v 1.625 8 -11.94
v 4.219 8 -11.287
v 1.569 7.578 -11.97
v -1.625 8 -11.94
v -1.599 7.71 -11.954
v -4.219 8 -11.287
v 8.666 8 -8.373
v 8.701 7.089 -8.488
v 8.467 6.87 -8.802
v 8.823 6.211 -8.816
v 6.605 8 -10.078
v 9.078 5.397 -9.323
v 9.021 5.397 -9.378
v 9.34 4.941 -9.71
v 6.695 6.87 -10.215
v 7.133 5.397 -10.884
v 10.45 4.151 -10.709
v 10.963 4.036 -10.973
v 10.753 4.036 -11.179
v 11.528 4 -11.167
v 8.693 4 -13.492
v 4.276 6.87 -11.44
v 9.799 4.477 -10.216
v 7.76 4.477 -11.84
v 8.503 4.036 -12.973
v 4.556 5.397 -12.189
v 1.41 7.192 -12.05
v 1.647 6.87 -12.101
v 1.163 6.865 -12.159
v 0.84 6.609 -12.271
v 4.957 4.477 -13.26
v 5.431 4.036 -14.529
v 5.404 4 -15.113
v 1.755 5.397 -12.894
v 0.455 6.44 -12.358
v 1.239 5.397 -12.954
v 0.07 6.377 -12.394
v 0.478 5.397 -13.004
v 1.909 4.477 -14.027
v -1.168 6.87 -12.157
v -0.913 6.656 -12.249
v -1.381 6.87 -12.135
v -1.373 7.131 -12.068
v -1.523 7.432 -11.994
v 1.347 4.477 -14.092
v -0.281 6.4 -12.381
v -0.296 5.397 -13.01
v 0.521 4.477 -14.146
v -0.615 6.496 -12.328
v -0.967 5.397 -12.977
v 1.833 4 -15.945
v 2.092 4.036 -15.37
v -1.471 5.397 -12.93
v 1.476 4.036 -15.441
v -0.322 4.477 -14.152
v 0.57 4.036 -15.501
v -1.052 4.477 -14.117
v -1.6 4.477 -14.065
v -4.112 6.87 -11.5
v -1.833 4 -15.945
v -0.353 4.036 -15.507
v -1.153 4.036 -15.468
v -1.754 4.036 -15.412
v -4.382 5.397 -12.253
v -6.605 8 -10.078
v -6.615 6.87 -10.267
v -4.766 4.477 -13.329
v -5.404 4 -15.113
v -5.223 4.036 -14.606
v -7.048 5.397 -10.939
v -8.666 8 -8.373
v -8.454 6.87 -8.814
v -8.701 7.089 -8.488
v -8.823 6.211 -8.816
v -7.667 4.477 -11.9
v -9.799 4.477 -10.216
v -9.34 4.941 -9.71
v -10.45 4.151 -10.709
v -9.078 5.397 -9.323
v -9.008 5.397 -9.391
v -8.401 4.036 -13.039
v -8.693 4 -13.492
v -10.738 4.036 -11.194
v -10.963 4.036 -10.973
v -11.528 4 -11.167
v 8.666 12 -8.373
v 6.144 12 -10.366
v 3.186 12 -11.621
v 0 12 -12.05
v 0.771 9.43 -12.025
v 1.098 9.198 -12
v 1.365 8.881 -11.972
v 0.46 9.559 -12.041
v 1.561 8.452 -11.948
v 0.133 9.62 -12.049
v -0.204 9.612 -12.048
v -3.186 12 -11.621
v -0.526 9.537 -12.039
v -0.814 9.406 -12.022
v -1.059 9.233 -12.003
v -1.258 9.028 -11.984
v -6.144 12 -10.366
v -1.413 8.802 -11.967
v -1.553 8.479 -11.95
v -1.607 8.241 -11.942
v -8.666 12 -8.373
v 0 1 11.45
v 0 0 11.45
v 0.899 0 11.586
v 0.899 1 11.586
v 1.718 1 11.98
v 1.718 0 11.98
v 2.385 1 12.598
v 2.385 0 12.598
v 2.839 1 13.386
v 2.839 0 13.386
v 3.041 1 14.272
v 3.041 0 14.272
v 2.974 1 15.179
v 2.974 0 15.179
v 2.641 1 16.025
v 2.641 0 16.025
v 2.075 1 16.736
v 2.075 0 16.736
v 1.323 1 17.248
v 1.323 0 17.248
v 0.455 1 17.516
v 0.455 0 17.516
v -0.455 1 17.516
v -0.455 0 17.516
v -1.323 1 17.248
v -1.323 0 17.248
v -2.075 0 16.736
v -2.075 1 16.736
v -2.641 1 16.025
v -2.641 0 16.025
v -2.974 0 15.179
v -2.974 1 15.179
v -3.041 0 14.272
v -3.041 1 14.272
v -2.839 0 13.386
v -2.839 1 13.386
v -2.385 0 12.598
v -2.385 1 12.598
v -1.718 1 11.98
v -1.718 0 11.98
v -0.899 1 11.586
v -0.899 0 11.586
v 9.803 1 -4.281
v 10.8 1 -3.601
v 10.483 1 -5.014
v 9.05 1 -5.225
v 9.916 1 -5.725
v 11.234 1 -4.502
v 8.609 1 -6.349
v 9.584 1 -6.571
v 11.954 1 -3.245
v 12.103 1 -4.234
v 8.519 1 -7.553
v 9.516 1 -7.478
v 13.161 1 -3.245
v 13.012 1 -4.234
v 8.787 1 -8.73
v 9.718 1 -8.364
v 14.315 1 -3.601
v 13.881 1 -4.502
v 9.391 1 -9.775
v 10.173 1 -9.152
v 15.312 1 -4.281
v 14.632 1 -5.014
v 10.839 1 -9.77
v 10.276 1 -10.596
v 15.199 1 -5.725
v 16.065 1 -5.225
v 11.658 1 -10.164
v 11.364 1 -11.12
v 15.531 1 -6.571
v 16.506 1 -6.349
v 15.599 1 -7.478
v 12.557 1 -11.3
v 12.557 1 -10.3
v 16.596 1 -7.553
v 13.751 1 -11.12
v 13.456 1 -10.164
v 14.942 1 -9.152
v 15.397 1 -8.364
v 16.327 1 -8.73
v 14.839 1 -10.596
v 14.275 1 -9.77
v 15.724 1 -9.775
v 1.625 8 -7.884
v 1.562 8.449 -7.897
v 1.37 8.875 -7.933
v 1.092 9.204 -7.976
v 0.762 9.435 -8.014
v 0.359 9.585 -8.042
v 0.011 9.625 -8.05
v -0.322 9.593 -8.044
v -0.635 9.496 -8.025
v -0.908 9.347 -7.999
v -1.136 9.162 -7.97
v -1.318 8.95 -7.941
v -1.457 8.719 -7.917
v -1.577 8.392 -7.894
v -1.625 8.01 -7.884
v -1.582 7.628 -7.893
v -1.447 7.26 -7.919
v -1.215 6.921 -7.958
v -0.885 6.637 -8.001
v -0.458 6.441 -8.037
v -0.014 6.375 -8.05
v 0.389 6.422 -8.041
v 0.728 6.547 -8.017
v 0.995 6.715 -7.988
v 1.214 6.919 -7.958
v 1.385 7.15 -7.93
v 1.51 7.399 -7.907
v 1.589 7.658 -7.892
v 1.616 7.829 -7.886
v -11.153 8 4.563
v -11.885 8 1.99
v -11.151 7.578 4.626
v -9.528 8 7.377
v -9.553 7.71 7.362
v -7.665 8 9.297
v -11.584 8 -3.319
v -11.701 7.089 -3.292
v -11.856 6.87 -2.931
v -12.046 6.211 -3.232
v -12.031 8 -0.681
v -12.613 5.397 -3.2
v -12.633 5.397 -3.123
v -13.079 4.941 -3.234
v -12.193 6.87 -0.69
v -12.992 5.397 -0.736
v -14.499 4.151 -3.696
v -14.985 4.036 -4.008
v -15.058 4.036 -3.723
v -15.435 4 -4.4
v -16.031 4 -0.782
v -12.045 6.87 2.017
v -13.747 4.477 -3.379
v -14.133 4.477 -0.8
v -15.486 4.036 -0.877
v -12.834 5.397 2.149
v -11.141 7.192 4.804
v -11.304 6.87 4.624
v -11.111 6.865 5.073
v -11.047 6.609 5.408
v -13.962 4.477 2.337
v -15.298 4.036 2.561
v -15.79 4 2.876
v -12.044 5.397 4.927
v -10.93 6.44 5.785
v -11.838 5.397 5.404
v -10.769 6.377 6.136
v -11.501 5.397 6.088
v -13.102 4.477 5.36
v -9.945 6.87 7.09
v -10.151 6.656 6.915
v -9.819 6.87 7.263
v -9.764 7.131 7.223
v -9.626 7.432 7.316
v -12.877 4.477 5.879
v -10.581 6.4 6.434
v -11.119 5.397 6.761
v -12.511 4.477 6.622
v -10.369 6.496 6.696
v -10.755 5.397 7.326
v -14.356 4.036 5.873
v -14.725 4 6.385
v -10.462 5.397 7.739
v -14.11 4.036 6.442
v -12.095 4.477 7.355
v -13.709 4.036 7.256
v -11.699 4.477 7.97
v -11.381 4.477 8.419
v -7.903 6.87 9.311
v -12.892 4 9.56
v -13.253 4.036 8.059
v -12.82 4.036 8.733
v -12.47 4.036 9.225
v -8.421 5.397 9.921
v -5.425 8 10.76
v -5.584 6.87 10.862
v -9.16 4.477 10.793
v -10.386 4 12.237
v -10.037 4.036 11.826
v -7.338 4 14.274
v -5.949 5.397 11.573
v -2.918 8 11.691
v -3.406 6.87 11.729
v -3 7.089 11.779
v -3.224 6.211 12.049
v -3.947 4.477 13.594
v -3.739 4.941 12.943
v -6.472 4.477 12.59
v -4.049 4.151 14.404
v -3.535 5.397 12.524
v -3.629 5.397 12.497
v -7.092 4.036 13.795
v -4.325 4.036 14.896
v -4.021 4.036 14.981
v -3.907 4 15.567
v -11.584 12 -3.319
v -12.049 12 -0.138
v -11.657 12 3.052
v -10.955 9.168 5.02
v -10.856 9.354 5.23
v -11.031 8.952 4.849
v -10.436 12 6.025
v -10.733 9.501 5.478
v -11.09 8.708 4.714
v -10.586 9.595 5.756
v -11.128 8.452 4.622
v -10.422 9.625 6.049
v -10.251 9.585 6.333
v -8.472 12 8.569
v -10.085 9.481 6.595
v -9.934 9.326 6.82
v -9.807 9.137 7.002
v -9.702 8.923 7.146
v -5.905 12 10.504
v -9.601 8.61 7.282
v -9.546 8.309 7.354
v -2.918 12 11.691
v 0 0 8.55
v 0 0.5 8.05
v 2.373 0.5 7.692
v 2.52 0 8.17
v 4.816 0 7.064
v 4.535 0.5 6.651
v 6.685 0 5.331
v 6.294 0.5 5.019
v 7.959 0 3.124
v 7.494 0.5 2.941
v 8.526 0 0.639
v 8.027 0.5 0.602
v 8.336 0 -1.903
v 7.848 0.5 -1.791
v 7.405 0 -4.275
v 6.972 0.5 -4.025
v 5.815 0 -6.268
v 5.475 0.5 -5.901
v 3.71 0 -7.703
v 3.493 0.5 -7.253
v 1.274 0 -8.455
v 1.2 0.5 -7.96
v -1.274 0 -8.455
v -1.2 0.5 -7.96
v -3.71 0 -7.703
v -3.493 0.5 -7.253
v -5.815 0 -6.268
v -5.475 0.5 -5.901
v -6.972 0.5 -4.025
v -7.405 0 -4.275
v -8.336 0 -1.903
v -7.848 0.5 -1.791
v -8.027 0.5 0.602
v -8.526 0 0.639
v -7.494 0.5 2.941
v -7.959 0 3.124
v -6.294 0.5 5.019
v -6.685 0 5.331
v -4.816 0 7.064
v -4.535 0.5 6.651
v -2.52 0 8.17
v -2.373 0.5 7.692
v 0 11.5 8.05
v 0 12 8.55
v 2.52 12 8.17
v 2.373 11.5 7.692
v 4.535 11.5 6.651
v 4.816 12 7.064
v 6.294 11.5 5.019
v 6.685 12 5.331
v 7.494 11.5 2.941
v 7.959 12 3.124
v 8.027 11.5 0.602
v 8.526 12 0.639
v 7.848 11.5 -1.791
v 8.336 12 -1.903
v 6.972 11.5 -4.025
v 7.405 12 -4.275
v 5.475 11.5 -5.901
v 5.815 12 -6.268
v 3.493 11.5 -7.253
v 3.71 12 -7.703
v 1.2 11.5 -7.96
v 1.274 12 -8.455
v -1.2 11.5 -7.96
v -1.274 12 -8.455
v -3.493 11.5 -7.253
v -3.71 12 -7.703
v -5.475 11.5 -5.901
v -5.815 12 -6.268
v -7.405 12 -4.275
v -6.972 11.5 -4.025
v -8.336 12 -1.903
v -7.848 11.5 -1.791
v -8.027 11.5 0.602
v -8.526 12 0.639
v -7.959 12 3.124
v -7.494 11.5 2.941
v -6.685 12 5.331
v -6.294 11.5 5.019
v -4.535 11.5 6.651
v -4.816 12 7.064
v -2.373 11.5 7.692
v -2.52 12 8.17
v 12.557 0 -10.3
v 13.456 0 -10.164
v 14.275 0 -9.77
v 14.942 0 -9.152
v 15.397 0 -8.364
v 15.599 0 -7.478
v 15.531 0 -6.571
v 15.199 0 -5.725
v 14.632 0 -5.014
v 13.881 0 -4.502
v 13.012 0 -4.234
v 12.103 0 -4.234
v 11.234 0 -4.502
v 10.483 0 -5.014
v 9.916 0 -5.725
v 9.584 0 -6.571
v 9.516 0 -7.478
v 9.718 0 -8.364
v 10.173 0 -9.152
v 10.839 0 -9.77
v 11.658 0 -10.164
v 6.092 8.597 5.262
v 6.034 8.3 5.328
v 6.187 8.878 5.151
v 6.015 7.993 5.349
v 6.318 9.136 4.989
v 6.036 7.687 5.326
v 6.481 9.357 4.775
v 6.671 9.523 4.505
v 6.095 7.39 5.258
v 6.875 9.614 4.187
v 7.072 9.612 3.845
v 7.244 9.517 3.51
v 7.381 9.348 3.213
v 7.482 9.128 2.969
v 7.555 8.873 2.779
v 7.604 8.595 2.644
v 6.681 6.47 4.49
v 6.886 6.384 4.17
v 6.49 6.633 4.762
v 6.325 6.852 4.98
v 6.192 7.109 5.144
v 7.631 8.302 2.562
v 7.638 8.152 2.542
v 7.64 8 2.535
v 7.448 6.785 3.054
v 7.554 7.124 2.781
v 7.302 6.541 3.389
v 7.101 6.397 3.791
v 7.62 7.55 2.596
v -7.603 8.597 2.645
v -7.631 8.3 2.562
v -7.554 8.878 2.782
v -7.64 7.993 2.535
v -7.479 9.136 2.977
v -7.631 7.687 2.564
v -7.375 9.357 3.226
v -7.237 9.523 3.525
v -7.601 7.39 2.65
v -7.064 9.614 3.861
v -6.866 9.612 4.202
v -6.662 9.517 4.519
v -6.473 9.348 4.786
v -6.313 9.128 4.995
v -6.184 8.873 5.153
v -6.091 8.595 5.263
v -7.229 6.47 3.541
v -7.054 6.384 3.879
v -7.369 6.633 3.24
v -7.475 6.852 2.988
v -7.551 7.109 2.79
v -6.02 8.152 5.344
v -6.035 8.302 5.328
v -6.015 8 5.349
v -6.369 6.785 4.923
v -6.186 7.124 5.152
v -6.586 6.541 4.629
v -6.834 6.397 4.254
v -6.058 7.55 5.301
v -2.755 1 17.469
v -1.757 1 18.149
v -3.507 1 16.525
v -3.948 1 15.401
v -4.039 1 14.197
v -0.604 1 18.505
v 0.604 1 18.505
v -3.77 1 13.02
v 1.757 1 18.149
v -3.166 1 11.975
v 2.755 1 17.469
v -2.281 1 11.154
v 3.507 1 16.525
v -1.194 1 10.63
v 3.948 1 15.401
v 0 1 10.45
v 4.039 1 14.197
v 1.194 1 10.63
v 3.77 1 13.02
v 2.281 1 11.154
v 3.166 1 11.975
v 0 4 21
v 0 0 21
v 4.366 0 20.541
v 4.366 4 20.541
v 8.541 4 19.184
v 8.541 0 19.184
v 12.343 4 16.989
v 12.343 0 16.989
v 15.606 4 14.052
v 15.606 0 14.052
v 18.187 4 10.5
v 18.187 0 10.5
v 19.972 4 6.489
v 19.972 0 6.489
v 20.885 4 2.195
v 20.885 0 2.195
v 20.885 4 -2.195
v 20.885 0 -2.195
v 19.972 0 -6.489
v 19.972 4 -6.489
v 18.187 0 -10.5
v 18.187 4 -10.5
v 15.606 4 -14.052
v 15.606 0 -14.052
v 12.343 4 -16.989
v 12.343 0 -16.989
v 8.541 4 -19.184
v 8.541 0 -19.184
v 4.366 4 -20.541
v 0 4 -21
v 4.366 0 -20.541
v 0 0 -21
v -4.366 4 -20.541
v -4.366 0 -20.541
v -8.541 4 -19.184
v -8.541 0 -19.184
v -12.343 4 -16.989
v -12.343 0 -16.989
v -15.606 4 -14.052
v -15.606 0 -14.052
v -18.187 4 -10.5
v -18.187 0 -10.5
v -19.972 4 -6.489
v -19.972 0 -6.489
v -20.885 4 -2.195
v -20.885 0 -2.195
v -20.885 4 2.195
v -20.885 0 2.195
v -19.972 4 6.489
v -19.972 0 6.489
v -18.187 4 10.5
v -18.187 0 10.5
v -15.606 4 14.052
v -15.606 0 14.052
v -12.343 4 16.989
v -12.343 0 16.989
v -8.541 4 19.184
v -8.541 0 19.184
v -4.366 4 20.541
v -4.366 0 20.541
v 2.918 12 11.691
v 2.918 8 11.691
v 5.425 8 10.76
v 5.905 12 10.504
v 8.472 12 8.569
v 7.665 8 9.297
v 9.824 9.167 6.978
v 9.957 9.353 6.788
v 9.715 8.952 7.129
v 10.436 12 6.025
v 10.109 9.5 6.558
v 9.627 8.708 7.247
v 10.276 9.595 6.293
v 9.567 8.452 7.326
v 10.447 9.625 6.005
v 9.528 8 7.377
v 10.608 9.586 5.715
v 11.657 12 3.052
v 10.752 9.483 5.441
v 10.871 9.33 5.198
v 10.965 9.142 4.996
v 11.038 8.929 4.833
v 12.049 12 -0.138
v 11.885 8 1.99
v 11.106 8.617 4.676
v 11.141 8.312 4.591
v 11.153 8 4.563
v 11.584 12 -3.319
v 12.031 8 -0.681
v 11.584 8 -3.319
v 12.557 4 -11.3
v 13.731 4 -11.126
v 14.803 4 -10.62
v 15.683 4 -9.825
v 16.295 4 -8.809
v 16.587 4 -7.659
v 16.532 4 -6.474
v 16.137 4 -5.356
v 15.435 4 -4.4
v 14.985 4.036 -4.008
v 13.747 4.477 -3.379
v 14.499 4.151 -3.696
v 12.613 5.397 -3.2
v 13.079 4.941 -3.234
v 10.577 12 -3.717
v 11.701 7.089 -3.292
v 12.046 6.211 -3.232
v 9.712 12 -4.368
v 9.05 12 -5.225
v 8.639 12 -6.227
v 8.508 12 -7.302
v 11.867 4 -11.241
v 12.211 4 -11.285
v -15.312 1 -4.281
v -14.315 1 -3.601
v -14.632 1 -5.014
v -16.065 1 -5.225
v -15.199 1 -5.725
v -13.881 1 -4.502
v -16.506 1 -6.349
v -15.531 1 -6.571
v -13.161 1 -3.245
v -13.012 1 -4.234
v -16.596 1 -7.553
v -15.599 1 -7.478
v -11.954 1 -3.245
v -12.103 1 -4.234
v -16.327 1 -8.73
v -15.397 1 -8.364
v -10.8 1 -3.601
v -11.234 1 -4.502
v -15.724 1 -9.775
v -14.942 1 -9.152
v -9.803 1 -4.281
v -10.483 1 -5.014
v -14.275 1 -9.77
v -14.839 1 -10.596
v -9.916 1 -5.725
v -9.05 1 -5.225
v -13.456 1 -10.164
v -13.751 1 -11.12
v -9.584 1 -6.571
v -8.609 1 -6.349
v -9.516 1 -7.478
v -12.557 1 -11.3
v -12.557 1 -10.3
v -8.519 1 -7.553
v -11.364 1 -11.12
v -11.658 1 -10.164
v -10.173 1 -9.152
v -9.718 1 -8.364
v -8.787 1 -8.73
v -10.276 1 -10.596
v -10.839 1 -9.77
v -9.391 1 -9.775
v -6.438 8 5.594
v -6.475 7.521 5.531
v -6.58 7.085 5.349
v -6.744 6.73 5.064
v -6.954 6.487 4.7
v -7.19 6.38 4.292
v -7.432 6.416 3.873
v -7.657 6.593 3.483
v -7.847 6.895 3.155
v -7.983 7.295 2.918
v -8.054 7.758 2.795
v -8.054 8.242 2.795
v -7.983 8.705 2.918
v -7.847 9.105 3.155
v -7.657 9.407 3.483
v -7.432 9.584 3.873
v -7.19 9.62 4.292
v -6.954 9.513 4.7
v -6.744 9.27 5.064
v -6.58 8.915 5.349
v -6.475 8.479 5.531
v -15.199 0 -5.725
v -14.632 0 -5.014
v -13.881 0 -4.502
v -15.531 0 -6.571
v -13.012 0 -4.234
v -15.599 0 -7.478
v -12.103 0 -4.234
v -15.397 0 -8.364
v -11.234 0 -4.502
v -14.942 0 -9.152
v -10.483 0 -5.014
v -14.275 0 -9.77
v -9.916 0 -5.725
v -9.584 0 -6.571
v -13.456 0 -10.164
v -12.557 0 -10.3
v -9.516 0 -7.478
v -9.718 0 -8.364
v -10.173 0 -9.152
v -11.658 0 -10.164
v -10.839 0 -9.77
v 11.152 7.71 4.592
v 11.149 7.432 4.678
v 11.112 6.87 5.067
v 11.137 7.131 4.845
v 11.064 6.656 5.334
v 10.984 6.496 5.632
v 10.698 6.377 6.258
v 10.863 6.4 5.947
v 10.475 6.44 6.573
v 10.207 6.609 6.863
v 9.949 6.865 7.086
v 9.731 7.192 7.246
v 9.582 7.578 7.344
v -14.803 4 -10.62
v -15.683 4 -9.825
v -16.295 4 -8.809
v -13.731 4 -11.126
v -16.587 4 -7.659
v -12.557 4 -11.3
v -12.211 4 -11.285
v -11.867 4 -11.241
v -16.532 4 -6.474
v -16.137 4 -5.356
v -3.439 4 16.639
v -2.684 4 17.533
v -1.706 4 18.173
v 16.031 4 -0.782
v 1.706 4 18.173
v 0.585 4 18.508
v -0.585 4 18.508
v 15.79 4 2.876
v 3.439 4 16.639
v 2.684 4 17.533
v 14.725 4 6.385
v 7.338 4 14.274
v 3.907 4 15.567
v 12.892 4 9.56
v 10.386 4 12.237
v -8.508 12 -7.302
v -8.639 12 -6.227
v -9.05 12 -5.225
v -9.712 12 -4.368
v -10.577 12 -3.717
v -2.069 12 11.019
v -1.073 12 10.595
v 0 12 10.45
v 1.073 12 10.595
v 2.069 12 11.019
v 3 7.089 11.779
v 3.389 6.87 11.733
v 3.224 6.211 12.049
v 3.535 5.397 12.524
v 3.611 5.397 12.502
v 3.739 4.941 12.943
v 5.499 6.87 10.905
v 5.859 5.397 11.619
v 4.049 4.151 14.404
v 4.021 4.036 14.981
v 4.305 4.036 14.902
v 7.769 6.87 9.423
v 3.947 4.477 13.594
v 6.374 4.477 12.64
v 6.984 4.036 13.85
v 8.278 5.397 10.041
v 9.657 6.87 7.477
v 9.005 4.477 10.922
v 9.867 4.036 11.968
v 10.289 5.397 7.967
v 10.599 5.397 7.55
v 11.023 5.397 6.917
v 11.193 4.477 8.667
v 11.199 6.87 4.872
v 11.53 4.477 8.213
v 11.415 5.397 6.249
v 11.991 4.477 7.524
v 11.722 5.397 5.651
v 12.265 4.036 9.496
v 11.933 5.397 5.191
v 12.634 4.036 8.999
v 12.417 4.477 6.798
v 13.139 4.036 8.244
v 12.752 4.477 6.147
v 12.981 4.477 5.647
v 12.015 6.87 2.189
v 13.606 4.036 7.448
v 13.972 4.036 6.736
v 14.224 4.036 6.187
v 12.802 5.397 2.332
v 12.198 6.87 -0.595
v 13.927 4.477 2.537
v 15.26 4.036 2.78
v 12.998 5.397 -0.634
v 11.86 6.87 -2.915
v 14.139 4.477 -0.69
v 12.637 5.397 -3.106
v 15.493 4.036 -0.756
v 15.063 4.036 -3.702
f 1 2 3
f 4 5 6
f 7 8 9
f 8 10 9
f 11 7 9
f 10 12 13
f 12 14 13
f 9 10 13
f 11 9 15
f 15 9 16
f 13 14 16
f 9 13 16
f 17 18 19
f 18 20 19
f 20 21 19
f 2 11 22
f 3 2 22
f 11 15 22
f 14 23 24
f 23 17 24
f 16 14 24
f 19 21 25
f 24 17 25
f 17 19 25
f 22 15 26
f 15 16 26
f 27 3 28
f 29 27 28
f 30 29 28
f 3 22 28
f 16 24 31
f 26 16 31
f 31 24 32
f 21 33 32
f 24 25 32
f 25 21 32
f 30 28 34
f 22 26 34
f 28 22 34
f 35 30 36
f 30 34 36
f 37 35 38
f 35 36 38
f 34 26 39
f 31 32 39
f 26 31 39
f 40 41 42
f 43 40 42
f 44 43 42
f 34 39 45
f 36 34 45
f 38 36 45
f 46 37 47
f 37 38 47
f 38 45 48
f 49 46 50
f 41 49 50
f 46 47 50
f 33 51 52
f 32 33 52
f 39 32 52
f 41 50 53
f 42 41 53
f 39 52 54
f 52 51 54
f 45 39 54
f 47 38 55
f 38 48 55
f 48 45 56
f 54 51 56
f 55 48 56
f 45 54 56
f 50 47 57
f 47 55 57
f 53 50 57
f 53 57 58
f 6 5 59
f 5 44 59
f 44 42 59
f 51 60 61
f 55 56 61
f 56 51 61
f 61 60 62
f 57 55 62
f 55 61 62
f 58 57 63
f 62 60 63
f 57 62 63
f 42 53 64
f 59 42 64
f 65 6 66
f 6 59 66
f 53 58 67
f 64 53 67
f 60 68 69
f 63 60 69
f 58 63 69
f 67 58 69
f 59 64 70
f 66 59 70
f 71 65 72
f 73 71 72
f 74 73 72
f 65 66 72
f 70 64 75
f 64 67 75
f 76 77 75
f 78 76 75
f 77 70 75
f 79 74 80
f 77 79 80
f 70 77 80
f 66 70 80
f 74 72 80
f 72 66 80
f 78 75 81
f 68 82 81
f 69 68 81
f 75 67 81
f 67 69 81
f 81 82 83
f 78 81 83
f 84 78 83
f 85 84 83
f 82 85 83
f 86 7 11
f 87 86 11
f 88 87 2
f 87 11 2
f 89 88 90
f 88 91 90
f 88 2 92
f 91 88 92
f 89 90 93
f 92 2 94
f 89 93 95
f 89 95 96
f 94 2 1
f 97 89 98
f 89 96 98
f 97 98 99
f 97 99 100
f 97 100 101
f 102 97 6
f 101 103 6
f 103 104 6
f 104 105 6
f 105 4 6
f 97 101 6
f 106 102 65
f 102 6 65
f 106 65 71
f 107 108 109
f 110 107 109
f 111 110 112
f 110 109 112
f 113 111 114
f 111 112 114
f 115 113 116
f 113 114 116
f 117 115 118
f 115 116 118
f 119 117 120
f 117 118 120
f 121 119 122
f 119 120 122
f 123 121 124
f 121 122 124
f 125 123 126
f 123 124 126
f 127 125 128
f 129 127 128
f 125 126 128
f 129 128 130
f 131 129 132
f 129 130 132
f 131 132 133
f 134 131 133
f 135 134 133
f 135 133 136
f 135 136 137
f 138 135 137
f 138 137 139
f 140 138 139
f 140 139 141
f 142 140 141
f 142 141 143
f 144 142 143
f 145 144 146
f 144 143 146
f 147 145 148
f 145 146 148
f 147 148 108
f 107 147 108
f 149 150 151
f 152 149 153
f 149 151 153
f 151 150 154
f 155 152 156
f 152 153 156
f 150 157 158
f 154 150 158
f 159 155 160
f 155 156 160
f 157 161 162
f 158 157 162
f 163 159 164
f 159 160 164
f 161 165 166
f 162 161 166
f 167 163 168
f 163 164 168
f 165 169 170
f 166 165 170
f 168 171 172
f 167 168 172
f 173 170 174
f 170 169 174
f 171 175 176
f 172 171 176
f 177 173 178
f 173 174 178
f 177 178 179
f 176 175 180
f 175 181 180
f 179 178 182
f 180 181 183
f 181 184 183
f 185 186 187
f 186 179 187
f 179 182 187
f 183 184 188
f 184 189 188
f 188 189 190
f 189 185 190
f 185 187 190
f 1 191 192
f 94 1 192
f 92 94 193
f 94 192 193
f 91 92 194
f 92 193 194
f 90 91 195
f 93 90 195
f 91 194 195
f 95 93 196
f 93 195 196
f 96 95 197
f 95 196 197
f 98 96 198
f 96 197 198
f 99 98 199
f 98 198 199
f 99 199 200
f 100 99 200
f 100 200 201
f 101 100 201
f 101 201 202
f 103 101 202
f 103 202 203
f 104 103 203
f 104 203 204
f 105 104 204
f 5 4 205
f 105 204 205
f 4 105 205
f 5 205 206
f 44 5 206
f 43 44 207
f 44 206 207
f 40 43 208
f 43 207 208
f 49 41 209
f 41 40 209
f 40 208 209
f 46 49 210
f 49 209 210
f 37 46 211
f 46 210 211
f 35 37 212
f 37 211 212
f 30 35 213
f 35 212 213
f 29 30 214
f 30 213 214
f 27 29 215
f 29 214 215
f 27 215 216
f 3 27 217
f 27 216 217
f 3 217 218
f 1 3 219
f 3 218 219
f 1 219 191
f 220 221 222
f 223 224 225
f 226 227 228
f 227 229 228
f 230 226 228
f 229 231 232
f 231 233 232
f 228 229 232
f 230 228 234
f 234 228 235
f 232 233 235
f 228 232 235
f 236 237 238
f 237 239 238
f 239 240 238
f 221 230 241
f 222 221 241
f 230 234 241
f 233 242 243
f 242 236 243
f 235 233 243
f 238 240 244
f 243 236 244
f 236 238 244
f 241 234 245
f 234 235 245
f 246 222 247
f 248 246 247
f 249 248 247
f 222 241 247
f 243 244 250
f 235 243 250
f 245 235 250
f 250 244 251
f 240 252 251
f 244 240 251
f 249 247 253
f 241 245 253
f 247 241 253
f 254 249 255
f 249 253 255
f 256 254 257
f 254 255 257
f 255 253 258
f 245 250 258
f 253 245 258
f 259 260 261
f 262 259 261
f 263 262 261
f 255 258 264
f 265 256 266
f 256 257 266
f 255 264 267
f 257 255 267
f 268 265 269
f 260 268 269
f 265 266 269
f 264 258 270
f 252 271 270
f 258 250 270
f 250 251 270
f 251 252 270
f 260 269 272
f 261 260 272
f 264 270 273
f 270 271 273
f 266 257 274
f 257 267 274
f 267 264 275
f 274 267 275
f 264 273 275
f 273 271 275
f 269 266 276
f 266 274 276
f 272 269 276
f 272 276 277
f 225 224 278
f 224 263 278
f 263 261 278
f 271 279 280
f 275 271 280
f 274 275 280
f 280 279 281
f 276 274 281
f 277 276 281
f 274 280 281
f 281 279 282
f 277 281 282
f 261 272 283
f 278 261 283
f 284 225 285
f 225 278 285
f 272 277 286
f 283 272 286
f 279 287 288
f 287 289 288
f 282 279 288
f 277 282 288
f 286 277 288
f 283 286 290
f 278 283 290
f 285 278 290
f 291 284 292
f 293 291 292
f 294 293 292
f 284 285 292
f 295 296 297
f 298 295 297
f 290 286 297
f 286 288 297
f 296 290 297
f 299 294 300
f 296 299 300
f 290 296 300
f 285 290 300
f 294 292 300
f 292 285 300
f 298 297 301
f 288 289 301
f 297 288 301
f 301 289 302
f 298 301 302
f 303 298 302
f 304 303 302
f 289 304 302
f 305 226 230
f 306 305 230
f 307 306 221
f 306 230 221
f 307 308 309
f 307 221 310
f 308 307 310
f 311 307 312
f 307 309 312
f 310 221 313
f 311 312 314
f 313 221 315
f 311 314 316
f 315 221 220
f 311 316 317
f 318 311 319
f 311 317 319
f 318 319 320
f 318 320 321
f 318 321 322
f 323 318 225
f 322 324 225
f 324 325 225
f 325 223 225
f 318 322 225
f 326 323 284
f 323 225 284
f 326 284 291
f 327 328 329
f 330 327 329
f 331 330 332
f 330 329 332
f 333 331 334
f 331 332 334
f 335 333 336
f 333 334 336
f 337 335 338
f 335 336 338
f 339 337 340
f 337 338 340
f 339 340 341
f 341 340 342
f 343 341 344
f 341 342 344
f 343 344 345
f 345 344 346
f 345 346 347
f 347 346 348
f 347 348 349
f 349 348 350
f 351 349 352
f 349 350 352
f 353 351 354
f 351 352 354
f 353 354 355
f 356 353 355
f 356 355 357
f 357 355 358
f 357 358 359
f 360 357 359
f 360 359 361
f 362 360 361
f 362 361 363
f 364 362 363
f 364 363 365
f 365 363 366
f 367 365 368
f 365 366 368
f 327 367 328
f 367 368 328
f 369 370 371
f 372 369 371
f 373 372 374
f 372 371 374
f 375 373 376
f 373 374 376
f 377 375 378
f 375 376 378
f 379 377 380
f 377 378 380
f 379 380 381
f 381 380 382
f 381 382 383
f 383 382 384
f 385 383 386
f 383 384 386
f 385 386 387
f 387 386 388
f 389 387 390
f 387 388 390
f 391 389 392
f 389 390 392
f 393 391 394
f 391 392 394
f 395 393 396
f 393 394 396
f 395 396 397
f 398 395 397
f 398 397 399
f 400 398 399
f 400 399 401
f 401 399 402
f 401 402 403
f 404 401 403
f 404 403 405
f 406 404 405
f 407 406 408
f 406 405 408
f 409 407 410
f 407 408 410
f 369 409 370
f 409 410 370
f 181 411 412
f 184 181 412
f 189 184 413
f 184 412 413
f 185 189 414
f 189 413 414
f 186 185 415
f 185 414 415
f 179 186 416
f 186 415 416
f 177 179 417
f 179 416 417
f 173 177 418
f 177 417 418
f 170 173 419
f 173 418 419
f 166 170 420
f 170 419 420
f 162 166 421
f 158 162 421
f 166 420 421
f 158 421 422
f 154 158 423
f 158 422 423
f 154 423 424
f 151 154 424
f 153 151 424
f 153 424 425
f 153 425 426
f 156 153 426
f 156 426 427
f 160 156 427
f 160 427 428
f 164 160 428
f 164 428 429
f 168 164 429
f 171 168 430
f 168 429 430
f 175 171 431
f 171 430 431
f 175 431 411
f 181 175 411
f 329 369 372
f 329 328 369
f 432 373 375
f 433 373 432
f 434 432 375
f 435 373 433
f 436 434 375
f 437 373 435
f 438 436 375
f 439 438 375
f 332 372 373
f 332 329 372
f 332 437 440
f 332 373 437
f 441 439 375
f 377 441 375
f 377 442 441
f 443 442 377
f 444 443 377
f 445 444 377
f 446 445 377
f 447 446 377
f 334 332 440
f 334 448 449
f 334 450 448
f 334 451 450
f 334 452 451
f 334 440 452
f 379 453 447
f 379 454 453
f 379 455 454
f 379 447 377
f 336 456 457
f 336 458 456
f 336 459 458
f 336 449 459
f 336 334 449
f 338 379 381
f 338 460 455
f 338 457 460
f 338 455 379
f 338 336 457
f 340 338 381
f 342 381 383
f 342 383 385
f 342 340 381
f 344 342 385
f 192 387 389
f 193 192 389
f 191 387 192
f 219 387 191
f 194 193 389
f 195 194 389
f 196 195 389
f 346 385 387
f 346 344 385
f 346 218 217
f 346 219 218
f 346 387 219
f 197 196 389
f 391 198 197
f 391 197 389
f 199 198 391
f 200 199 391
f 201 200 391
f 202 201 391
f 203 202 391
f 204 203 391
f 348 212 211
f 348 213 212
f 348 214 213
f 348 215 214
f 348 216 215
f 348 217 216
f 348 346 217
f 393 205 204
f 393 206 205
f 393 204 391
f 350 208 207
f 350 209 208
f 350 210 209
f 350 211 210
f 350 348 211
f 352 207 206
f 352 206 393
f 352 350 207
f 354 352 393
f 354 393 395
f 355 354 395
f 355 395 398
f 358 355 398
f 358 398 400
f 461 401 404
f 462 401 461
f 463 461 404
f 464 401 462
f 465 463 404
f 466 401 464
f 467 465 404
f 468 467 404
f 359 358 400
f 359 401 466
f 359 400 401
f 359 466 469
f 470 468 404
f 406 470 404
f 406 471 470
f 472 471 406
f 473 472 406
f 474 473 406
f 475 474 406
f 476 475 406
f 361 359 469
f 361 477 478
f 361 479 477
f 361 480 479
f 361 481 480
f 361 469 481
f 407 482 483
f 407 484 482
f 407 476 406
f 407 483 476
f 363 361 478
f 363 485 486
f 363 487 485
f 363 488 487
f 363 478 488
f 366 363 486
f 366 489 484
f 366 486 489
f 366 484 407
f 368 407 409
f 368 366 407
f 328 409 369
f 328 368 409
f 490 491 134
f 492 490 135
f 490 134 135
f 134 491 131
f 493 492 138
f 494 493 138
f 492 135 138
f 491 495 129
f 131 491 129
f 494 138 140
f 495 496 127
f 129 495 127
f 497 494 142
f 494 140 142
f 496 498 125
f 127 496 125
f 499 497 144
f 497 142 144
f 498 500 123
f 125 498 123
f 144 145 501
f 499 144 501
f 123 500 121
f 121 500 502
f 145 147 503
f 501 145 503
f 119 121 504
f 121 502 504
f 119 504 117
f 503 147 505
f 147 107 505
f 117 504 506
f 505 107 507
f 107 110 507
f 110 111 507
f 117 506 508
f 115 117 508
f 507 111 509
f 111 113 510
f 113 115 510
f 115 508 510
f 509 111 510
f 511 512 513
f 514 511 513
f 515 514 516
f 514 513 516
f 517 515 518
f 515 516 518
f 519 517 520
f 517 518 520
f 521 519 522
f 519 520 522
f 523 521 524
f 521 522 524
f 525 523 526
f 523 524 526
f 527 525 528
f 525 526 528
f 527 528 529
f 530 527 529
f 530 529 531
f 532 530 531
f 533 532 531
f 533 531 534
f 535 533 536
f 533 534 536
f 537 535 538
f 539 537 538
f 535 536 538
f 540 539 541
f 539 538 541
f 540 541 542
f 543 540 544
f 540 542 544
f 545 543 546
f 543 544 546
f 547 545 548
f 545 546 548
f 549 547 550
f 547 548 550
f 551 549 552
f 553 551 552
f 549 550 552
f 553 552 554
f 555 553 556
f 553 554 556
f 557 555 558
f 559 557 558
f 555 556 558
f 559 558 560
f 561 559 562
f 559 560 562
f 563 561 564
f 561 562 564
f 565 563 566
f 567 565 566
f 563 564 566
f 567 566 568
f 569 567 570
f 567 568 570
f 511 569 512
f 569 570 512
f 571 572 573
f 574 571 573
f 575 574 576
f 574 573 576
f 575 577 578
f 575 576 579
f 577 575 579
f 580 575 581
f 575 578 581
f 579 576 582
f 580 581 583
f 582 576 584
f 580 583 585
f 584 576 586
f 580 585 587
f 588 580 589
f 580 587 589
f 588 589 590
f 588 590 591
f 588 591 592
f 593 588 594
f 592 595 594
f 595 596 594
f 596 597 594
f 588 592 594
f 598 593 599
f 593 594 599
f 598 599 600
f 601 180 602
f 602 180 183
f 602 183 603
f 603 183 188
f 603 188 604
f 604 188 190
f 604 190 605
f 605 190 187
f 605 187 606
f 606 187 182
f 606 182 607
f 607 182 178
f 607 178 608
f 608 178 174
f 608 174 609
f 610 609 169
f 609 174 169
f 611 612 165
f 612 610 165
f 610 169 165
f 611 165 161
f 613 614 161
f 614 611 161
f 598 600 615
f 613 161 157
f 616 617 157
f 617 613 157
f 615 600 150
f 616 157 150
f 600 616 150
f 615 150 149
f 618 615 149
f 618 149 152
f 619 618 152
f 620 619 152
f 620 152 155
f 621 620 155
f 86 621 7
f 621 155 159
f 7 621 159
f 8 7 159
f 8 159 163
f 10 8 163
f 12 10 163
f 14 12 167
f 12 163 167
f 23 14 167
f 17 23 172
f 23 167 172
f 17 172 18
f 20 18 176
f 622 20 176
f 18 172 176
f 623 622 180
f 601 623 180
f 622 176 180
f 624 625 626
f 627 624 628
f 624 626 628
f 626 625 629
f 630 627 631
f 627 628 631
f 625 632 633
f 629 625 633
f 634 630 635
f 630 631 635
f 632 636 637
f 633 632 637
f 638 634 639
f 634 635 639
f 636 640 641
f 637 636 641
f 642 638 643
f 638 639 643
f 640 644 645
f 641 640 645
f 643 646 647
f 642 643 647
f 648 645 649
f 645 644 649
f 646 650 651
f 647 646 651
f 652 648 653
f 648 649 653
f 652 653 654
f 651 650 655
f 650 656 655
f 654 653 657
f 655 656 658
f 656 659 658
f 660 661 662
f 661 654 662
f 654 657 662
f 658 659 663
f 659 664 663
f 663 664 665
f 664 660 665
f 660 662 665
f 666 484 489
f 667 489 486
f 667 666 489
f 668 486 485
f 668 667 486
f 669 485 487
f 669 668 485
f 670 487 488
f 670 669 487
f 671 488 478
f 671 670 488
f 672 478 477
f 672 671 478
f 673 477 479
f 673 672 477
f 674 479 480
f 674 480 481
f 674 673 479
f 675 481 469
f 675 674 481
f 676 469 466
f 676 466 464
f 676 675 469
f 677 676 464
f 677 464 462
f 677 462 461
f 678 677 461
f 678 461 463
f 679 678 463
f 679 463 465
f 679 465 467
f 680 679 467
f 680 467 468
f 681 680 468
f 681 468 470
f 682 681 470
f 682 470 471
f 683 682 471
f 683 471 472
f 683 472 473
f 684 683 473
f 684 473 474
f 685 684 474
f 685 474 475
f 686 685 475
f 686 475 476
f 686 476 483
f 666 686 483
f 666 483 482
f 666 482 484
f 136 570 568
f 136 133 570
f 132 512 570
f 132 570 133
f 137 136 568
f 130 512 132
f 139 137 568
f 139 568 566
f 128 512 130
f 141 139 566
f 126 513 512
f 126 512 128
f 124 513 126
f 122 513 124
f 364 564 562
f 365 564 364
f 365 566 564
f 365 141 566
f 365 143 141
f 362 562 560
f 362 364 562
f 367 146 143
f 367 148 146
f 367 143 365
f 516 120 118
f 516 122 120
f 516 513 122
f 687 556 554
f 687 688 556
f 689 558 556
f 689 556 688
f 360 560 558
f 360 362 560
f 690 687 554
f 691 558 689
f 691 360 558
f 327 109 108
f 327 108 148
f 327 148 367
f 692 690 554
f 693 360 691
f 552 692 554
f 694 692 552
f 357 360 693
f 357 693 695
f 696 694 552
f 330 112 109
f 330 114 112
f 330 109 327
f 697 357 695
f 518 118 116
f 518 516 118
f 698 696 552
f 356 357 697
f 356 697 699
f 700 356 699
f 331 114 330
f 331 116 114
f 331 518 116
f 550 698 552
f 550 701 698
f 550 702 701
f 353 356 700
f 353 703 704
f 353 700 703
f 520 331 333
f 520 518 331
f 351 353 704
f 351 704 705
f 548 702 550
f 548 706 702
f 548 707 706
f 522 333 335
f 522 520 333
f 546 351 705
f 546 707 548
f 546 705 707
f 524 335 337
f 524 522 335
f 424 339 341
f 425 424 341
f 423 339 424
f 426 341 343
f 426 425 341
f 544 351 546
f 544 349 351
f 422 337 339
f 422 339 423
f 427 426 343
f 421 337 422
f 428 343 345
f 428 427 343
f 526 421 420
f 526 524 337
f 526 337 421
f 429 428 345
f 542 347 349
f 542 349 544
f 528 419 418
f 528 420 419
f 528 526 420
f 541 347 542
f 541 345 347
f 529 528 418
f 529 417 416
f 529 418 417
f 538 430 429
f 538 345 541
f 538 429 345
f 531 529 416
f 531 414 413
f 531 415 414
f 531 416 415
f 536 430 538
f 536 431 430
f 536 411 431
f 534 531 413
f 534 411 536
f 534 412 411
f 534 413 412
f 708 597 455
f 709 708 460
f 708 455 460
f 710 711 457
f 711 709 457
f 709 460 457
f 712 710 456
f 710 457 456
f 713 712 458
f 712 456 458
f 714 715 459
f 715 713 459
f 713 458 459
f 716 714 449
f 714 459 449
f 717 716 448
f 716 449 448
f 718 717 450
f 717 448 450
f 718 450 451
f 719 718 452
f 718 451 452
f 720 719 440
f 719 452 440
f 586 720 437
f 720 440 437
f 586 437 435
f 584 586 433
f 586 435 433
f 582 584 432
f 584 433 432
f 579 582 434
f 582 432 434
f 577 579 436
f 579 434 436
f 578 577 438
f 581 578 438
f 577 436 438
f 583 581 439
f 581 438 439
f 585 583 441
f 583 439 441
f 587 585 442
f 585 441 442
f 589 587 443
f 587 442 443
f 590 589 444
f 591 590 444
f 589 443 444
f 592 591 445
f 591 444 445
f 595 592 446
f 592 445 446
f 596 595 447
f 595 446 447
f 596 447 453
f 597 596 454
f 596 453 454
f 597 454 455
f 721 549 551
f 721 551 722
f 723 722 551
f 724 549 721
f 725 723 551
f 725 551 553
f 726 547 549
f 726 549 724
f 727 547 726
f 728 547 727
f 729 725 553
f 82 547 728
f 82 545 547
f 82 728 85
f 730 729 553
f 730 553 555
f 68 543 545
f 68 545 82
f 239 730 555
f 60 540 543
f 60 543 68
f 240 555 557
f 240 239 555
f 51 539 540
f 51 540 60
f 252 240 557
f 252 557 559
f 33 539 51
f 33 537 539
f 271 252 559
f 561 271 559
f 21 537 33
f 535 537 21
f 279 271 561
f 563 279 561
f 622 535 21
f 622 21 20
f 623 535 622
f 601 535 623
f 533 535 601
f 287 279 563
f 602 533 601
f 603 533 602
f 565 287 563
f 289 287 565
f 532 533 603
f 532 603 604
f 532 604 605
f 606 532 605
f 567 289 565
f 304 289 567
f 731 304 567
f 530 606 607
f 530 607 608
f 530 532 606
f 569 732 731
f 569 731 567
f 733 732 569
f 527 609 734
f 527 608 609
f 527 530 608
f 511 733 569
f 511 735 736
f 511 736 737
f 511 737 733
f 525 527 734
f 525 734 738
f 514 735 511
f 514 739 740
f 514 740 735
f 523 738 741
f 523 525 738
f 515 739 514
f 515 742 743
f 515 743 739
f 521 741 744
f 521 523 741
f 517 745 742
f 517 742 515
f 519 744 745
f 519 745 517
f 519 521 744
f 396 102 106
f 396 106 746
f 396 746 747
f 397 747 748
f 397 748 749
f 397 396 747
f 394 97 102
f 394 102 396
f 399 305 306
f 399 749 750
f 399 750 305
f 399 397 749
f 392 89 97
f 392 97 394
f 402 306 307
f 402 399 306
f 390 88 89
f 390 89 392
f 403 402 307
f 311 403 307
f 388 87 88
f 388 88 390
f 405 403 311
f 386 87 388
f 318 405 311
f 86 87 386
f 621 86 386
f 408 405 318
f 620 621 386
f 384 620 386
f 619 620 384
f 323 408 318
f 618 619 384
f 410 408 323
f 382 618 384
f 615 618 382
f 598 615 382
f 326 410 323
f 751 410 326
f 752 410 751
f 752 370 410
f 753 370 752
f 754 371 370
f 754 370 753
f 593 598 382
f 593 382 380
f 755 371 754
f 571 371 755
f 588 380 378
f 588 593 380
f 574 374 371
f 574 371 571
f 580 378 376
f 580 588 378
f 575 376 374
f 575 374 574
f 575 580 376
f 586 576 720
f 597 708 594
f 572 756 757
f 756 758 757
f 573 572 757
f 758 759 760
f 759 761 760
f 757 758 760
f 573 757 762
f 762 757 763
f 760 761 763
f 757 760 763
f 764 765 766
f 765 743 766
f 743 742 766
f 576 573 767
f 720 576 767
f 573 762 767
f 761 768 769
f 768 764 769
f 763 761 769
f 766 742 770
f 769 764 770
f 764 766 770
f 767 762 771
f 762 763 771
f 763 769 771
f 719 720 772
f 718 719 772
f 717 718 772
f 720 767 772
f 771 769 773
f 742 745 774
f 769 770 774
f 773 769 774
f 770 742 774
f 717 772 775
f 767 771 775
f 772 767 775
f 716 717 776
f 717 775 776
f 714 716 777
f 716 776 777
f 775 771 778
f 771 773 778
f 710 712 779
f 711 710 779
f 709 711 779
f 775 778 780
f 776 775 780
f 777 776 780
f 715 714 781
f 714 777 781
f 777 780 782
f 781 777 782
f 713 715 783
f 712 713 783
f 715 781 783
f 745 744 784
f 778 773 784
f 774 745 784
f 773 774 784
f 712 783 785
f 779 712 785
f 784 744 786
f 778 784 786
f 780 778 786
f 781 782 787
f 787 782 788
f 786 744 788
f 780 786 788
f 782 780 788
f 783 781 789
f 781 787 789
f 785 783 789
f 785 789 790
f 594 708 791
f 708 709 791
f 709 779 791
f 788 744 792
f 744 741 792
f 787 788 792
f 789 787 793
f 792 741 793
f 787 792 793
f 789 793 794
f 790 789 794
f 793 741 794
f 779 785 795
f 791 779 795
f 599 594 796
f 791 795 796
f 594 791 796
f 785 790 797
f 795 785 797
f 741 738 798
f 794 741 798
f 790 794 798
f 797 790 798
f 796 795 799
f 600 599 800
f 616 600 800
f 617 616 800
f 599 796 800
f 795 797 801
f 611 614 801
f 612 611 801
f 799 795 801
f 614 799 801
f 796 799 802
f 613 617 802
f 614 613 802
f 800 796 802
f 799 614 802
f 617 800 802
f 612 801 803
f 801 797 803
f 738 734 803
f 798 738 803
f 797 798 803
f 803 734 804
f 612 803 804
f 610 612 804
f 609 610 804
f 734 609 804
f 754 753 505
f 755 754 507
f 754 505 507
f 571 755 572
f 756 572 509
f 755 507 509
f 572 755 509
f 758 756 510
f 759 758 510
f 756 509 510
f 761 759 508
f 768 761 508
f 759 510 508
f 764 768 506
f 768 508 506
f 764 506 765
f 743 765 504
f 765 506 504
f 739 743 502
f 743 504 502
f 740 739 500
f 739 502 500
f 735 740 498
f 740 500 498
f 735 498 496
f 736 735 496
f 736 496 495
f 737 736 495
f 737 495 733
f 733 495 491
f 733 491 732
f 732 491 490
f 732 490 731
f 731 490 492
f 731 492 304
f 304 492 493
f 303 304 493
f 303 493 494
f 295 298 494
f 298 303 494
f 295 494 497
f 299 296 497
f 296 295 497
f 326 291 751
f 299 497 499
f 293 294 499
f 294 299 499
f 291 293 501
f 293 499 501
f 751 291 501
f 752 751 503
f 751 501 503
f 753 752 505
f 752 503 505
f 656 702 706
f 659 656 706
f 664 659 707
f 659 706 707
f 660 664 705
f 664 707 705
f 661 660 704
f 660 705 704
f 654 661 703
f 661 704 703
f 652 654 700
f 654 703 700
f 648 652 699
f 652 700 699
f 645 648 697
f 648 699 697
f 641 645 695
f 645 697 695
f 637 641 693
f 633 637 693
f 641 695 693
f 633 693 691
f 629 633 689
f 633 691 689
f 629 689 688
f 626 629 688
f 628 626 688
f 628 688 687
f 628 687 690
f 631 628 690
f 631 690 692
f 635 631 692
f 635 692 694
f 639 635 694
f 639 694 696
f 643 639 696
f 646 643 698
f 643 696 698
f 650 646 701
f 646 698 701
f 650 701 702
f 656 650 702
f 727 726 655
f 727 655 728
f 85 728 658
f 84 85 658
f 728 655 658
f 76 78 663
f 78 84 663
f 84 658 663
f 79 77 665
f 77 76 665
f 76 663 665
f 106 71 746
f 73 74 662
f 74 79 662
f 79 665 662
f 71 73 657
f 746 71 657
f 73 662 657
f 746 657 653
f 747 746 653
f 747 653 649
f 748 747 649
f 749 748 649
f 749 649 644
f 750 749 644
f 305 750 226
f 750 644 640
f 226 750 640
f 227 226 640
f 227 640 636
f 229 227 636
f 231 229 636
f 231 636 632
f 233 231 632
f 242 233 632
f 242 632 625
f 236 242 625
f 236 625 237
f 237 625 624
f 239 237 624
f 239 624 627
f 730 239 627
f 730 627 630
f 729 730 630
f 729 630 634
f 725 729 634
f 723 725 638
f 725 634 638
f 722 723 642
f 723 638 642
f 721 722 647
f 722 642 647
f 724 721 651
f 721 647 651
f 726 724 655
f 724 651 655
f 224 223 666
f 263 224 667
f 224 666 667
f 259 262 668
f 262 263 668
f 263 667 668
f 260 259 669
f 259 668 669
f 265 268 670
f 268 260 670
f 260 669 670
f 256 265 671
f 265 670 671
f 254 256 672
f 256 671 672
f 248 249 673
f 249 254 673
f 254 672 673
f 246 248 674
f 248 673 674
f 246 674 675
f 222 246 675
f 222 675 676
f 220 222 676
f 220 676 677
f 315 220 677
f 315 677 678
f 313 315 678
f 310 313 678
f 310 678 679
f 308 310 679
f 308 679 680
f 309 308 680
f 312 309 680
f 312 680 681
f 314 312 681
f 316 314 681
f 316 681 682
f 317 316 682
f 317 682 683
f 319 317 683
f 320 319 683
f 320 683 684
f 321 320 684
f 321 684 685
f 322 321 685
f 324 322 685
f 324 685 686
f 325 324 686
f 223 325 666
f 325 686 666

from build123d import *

# Parameters (mm, degrees)
CROQUIS2_R                        = 21
CROQUIS2_R_2                      = 8.05
SALIENTE_EXTRUIR1_DEPTH           = 4
CROQUIS3_R                        = 12.05
CROQUIS3_R_2                      = 8.05
SALIENTE_EXTRUIR2_DEPTH           = 8
REDONDEO1_R                       = 4
CORTAR_EXTRUIR2_REACH             = 34.031
CROQUIS5_R                        = 4.05
CROQUIS4_R                        = 1.625
CORTAR_EXTRUIR3_DEPTH             = 33.031234794
CORTAR_EXTRUIR4_REACH             = 41.705
CROQUIS6_R                        = 1.625
CORTAR_EXTRUIR4_DIRECTION_2_REACH = 41.705
CROQUIS7_R                        = 4.05
CROQUIS7_R_2                      = 3.05
SALIENTE_EXTRUIR3_DEPTH           = 1
CHAFL_N1_SIZE                     = 0.5
CORTAR_EXTRUIR5_REACH             = 41.705
CROQUIS8_R                        = 1.625
CORTAR_EXTRUIR5_DIRECTION_2_REACH = 41.705


with BuildPart() as part:
    # Croquis2 → Saliente-Extruir1 (new body)
    with BuildSketch(Plane(origin=(0, 0, 0), x_dir=(1, 0, 0), z_dir=(0, 1, 0))):
        with Locations(Location((0, 0, 0), (0, 0, 270))):
            Circle(CROQUIS2_R)
        with Locations(Location((0, 0, 0), (0, 0, 270))):
            Circle(CROQUIS2_R_2, mode=Mode.SUBTRACT)
    extrude(amount=SALIENTE_EXTRUIR1_DEPTH)

    # Croquis3 → Saliente-Extruir2 (add)
    with BuildSketch(Plane(origin=(0, 4, 0), x_dir=(1, 0, 0), z_dir=(0, 1, 0))):
        with Locations(Location((0, 0, 0), (0, 0, 270))):
            Circle(CROQUIS3_R)
        with Locations(Location((0, 0, 0), (0, 0, 270))):
            Circle(CROQUIS3_R_2, mode=Mode.SUBTRACT)
    extrude(amount=SALIENTE_EXTRUIR2_DEPTH)

    # Redondeo1
    redondeo1_edges = [part.edges().sort_by_distance(p)[0] for p in [
        (0, 4, -12.05),
    ]]
    fillet(redondeo1_edges, radius=REDONDEO1_R)

    # Croquis5 → Cortar-Extruir2 (cut, up to next)
    with BuildSketch(Plane.XZ, mode=Mode.PRIVATE) as cortar_extruir2_sk1:
        with Locations(Location((0, 14.5, 0), (0, 0, 270))):
            Circle(CROQUIS5_R)
    cortar_extruir2_tool1 = extrude(cortar_extruir2_sk1.sketch, amount=-CORTAR_EXTRUIR2_REACH, mode=Mode.PRIVATE) & part.part
    # Croquis5 → Cortar-Extruir2 (cut, up to next)
    with BuildSketch(Plane.XZ, mode=Mode.PRIVATE) as cortar_extruir2_sk2:
        with Locations(Location((12.557368355, -7.25, 0), (0, 0, 270))):
            Circle(CROQUIS5_R)
    cortar_extruir2_tool2 = extrude(cortar_extruir2_sk2.sketch, amount=-CORTAR_EXTRUIR2_REACH, mode=Mode.PRIVATE) & part.part
    # Croquis5 → Cortar-Extruir2 (cut, up to next)
    with BuildSketch(Plane.XZ, mode=Mode.PRIVATE) as cortar_extruir2_sk3:
        with Locations(Location((-12.557368355, -7.25, 0), (0, 0, 270))):
            Circle(CROQUIS5_R)
    cortar_extruir2_tool3 = extrude(cortar_extruir2_sk3.sketch, amount=-CORTAR_EXTRUIR2_REACH, mode=Mode.PRIVATE) & part.part
    add(cortar_extruir2_tool1.solids().sort_by_distance((0, 0, 14.5))[0], mode=Mode.SUBTRACT)
    add(cortar_extruir2_tool2.solids().sort_by_distance((12.557368, 0, -7.25))[0], mode=Mode.SUBTRACT)
    add(cortar_extruir2_tool3.solids().sort_by_distance((-12.557368, 0, -7.25))[0], mode=Mode.SUBTRACT)

    # Croquis4 → Cortar-Extruir3 (cut, through all)
    with BuildSketch(Plane.XY):
        with Locations((0, 8)):
            Circle(CROQUIS4_R)
    extrude(amount=-CORTAR_EXTRUIR3_DEPTH, mode=Mode.SUBTRACT)

    # Croquis6 → Cortar-Extruir4 (cut, up to next)
    with BuildSketch(Plane(origin=(7.250941954, 0, 4.186333289), x_dir=(-0.5000000000000033, 0, 0.8660254037844367), z_dir=(-0.8660254037844367, 0, -0.5000000000000033)), mode=Mode.PRIVATE) as cortar_extruir4_sk1:
        with Locations(Location((0, 8, 0), (0, 0, 180))):
            Circle(CROQUIS6_R)
    cortar_extruir4_tool1 = extrude(cortar_extruir4_sk1.sketch, amount=-CORTAR_EXTRUIR4_REACH, mode=Mode.PRIVATE) & part.part
    add(cortar_extruir4_tool1.solids().sort_by_distance((7.250942, 8, 4.186333))[0], mode=Mode.SUBTRACT)

    # Croquis6 → Cortar-Extruir4 direction 2 (cut, up to next)
    with BuildSketch(Plane(origin=(7.250941954, 0, 4.186333289), x_dir=(-0.5000000000000033, 0, 0.8660254037844367), z_dir=(-0.8660254037844367, 0, -0.5000000000000033)), mode=Mode.PRIVATE) as cortar_extruir4_direction_2_sk1:
        with Locations(Location((0, 8, 0), (0, 0, 180))):
            Circle(CROQUIS6_R)
    cortar_extruir4_direction_2_tool1 = extrude(cortar_extruir4_direction_2_sk1.sketch, amount=CORTAR_EXTRUIR4_DIRECTION_2_REACH, mode=Mode.PRIVATE) & part.part
    add(cortar_extruir4_direction_2_tool1.solids().sort_by_distance((7.250942, 8, 4.186333))[0], mode=Mode.SUBTRACT)

    # Croquis7 → Saliente-Extruir3 (add)
    # profile 1 of 3: a face of its own
    with BuildSketch(Plane.XZ):
        with Locations(Location((0, 14.5, 0), (0, 0, 270))):
            Circle(CROQUIS7_R)
        with Locations(Location((0, 14.5, 0), (0, 0, 270))):
            Circle(CROQUIS7_R_2, mode=Mode.SUBTRACT)
    # profile 2 of 3: a face of its own
    with BuildSketch(Plane.XZ):
        with Locations(Location((12.557368355, -7.25, 0), (0, 0, 270))):
            Circle(CROQUIS7_R)
        with Locations(Location((12.557368355, -7.25, 0), (0, 0, 270))):
            Circle(CROQUIS7_R_2, mode=Mode.SUBTRACT)
    # profile 3 of 3: a face of its own
    with BuildSketch(Plane.XZ):
        with Locations(Location((-12.557368355, -7.25, 0), (0, 0, 270))):
            Circle(CROQUIS7_R)
        with Locations(Location((-12.557368355, -7.25, 0), (0, 0, 270))):
            Circle(CROQUIS7_R_2, mode=Mode.SUBTRACT)
    extrude(amount=-SALIENTE_EXTRUIR3_DEPTH)

    # Chaflán1
    chafl_n1_edges = [part.edges().sort_by_distance(p)[0] for p in [
        (0, 12, -8.05),
        (0, 0, -8.05),
    ]]
    chamfer(chafl_n1_edges, length=CHAFL_N1_SIZE)

    # Croquis8 → Cortar-Extruir5 (cut, up to next)
    with BuildSketch(Plane(origin=(-7.250941954, 0, 4.186333289), x_dir=(-0.5000000000000002, 0, -0.8660254037844386), z_dir=(0.8660254037844386, 0, -0.5000000000000002)), mode=Mode.PRIVATE) as cortar_extruir5_sk1:
        with Locations(Location((0, 8, 0), (0, 0, 180))):
            Circle(CROQUIS8_R)
    cortar_extruir5_tool1 = extrude(cortar_extruir5_sk1.sketch, amount=-CORTAR_EXTRUIR5_REACH, mode=Mode.PRIVATE) & part.part
    add(cortar_extruir5_tool1.solids().sort_by_distance((-7.250942, 8, 4.186333))[0], mode=Mode.SUBTRACT)

    # Croquis8 → Cortar-Extruir5 direction 2 (cut, up to next)
    with BuildSketch(Plane(origin=(-7.250941954, 0, 4.186333289), x_dir=(-0.5000000000000002, 0, -0.8660254037844386), z_dir=(0.8660254037844386, 0, -0.5000000000000002)), mode=Mode.PRIVATE) as cortar_extruir5_direction_2_sk1:
        with Locations(Location((0, 8, 0), (0, 0, 180))):
            Circle(CROQUIS8_R)
    cortar_extruir5_direction_2_tool1 = extrude(cortar_extruir5_direction_2_sk1.sketch, amount=CORTAR_EXTRUIR5_DIRECTION_2_REACH, mode=Mode.PRIVATE) & part.part
    add(cortar_extruir5_direction_2_tool1.solids().sort_by_distance((-7.250942, 8, 4.186333))[0], mode=Mode.SUBTRACT)


solid = part.part
